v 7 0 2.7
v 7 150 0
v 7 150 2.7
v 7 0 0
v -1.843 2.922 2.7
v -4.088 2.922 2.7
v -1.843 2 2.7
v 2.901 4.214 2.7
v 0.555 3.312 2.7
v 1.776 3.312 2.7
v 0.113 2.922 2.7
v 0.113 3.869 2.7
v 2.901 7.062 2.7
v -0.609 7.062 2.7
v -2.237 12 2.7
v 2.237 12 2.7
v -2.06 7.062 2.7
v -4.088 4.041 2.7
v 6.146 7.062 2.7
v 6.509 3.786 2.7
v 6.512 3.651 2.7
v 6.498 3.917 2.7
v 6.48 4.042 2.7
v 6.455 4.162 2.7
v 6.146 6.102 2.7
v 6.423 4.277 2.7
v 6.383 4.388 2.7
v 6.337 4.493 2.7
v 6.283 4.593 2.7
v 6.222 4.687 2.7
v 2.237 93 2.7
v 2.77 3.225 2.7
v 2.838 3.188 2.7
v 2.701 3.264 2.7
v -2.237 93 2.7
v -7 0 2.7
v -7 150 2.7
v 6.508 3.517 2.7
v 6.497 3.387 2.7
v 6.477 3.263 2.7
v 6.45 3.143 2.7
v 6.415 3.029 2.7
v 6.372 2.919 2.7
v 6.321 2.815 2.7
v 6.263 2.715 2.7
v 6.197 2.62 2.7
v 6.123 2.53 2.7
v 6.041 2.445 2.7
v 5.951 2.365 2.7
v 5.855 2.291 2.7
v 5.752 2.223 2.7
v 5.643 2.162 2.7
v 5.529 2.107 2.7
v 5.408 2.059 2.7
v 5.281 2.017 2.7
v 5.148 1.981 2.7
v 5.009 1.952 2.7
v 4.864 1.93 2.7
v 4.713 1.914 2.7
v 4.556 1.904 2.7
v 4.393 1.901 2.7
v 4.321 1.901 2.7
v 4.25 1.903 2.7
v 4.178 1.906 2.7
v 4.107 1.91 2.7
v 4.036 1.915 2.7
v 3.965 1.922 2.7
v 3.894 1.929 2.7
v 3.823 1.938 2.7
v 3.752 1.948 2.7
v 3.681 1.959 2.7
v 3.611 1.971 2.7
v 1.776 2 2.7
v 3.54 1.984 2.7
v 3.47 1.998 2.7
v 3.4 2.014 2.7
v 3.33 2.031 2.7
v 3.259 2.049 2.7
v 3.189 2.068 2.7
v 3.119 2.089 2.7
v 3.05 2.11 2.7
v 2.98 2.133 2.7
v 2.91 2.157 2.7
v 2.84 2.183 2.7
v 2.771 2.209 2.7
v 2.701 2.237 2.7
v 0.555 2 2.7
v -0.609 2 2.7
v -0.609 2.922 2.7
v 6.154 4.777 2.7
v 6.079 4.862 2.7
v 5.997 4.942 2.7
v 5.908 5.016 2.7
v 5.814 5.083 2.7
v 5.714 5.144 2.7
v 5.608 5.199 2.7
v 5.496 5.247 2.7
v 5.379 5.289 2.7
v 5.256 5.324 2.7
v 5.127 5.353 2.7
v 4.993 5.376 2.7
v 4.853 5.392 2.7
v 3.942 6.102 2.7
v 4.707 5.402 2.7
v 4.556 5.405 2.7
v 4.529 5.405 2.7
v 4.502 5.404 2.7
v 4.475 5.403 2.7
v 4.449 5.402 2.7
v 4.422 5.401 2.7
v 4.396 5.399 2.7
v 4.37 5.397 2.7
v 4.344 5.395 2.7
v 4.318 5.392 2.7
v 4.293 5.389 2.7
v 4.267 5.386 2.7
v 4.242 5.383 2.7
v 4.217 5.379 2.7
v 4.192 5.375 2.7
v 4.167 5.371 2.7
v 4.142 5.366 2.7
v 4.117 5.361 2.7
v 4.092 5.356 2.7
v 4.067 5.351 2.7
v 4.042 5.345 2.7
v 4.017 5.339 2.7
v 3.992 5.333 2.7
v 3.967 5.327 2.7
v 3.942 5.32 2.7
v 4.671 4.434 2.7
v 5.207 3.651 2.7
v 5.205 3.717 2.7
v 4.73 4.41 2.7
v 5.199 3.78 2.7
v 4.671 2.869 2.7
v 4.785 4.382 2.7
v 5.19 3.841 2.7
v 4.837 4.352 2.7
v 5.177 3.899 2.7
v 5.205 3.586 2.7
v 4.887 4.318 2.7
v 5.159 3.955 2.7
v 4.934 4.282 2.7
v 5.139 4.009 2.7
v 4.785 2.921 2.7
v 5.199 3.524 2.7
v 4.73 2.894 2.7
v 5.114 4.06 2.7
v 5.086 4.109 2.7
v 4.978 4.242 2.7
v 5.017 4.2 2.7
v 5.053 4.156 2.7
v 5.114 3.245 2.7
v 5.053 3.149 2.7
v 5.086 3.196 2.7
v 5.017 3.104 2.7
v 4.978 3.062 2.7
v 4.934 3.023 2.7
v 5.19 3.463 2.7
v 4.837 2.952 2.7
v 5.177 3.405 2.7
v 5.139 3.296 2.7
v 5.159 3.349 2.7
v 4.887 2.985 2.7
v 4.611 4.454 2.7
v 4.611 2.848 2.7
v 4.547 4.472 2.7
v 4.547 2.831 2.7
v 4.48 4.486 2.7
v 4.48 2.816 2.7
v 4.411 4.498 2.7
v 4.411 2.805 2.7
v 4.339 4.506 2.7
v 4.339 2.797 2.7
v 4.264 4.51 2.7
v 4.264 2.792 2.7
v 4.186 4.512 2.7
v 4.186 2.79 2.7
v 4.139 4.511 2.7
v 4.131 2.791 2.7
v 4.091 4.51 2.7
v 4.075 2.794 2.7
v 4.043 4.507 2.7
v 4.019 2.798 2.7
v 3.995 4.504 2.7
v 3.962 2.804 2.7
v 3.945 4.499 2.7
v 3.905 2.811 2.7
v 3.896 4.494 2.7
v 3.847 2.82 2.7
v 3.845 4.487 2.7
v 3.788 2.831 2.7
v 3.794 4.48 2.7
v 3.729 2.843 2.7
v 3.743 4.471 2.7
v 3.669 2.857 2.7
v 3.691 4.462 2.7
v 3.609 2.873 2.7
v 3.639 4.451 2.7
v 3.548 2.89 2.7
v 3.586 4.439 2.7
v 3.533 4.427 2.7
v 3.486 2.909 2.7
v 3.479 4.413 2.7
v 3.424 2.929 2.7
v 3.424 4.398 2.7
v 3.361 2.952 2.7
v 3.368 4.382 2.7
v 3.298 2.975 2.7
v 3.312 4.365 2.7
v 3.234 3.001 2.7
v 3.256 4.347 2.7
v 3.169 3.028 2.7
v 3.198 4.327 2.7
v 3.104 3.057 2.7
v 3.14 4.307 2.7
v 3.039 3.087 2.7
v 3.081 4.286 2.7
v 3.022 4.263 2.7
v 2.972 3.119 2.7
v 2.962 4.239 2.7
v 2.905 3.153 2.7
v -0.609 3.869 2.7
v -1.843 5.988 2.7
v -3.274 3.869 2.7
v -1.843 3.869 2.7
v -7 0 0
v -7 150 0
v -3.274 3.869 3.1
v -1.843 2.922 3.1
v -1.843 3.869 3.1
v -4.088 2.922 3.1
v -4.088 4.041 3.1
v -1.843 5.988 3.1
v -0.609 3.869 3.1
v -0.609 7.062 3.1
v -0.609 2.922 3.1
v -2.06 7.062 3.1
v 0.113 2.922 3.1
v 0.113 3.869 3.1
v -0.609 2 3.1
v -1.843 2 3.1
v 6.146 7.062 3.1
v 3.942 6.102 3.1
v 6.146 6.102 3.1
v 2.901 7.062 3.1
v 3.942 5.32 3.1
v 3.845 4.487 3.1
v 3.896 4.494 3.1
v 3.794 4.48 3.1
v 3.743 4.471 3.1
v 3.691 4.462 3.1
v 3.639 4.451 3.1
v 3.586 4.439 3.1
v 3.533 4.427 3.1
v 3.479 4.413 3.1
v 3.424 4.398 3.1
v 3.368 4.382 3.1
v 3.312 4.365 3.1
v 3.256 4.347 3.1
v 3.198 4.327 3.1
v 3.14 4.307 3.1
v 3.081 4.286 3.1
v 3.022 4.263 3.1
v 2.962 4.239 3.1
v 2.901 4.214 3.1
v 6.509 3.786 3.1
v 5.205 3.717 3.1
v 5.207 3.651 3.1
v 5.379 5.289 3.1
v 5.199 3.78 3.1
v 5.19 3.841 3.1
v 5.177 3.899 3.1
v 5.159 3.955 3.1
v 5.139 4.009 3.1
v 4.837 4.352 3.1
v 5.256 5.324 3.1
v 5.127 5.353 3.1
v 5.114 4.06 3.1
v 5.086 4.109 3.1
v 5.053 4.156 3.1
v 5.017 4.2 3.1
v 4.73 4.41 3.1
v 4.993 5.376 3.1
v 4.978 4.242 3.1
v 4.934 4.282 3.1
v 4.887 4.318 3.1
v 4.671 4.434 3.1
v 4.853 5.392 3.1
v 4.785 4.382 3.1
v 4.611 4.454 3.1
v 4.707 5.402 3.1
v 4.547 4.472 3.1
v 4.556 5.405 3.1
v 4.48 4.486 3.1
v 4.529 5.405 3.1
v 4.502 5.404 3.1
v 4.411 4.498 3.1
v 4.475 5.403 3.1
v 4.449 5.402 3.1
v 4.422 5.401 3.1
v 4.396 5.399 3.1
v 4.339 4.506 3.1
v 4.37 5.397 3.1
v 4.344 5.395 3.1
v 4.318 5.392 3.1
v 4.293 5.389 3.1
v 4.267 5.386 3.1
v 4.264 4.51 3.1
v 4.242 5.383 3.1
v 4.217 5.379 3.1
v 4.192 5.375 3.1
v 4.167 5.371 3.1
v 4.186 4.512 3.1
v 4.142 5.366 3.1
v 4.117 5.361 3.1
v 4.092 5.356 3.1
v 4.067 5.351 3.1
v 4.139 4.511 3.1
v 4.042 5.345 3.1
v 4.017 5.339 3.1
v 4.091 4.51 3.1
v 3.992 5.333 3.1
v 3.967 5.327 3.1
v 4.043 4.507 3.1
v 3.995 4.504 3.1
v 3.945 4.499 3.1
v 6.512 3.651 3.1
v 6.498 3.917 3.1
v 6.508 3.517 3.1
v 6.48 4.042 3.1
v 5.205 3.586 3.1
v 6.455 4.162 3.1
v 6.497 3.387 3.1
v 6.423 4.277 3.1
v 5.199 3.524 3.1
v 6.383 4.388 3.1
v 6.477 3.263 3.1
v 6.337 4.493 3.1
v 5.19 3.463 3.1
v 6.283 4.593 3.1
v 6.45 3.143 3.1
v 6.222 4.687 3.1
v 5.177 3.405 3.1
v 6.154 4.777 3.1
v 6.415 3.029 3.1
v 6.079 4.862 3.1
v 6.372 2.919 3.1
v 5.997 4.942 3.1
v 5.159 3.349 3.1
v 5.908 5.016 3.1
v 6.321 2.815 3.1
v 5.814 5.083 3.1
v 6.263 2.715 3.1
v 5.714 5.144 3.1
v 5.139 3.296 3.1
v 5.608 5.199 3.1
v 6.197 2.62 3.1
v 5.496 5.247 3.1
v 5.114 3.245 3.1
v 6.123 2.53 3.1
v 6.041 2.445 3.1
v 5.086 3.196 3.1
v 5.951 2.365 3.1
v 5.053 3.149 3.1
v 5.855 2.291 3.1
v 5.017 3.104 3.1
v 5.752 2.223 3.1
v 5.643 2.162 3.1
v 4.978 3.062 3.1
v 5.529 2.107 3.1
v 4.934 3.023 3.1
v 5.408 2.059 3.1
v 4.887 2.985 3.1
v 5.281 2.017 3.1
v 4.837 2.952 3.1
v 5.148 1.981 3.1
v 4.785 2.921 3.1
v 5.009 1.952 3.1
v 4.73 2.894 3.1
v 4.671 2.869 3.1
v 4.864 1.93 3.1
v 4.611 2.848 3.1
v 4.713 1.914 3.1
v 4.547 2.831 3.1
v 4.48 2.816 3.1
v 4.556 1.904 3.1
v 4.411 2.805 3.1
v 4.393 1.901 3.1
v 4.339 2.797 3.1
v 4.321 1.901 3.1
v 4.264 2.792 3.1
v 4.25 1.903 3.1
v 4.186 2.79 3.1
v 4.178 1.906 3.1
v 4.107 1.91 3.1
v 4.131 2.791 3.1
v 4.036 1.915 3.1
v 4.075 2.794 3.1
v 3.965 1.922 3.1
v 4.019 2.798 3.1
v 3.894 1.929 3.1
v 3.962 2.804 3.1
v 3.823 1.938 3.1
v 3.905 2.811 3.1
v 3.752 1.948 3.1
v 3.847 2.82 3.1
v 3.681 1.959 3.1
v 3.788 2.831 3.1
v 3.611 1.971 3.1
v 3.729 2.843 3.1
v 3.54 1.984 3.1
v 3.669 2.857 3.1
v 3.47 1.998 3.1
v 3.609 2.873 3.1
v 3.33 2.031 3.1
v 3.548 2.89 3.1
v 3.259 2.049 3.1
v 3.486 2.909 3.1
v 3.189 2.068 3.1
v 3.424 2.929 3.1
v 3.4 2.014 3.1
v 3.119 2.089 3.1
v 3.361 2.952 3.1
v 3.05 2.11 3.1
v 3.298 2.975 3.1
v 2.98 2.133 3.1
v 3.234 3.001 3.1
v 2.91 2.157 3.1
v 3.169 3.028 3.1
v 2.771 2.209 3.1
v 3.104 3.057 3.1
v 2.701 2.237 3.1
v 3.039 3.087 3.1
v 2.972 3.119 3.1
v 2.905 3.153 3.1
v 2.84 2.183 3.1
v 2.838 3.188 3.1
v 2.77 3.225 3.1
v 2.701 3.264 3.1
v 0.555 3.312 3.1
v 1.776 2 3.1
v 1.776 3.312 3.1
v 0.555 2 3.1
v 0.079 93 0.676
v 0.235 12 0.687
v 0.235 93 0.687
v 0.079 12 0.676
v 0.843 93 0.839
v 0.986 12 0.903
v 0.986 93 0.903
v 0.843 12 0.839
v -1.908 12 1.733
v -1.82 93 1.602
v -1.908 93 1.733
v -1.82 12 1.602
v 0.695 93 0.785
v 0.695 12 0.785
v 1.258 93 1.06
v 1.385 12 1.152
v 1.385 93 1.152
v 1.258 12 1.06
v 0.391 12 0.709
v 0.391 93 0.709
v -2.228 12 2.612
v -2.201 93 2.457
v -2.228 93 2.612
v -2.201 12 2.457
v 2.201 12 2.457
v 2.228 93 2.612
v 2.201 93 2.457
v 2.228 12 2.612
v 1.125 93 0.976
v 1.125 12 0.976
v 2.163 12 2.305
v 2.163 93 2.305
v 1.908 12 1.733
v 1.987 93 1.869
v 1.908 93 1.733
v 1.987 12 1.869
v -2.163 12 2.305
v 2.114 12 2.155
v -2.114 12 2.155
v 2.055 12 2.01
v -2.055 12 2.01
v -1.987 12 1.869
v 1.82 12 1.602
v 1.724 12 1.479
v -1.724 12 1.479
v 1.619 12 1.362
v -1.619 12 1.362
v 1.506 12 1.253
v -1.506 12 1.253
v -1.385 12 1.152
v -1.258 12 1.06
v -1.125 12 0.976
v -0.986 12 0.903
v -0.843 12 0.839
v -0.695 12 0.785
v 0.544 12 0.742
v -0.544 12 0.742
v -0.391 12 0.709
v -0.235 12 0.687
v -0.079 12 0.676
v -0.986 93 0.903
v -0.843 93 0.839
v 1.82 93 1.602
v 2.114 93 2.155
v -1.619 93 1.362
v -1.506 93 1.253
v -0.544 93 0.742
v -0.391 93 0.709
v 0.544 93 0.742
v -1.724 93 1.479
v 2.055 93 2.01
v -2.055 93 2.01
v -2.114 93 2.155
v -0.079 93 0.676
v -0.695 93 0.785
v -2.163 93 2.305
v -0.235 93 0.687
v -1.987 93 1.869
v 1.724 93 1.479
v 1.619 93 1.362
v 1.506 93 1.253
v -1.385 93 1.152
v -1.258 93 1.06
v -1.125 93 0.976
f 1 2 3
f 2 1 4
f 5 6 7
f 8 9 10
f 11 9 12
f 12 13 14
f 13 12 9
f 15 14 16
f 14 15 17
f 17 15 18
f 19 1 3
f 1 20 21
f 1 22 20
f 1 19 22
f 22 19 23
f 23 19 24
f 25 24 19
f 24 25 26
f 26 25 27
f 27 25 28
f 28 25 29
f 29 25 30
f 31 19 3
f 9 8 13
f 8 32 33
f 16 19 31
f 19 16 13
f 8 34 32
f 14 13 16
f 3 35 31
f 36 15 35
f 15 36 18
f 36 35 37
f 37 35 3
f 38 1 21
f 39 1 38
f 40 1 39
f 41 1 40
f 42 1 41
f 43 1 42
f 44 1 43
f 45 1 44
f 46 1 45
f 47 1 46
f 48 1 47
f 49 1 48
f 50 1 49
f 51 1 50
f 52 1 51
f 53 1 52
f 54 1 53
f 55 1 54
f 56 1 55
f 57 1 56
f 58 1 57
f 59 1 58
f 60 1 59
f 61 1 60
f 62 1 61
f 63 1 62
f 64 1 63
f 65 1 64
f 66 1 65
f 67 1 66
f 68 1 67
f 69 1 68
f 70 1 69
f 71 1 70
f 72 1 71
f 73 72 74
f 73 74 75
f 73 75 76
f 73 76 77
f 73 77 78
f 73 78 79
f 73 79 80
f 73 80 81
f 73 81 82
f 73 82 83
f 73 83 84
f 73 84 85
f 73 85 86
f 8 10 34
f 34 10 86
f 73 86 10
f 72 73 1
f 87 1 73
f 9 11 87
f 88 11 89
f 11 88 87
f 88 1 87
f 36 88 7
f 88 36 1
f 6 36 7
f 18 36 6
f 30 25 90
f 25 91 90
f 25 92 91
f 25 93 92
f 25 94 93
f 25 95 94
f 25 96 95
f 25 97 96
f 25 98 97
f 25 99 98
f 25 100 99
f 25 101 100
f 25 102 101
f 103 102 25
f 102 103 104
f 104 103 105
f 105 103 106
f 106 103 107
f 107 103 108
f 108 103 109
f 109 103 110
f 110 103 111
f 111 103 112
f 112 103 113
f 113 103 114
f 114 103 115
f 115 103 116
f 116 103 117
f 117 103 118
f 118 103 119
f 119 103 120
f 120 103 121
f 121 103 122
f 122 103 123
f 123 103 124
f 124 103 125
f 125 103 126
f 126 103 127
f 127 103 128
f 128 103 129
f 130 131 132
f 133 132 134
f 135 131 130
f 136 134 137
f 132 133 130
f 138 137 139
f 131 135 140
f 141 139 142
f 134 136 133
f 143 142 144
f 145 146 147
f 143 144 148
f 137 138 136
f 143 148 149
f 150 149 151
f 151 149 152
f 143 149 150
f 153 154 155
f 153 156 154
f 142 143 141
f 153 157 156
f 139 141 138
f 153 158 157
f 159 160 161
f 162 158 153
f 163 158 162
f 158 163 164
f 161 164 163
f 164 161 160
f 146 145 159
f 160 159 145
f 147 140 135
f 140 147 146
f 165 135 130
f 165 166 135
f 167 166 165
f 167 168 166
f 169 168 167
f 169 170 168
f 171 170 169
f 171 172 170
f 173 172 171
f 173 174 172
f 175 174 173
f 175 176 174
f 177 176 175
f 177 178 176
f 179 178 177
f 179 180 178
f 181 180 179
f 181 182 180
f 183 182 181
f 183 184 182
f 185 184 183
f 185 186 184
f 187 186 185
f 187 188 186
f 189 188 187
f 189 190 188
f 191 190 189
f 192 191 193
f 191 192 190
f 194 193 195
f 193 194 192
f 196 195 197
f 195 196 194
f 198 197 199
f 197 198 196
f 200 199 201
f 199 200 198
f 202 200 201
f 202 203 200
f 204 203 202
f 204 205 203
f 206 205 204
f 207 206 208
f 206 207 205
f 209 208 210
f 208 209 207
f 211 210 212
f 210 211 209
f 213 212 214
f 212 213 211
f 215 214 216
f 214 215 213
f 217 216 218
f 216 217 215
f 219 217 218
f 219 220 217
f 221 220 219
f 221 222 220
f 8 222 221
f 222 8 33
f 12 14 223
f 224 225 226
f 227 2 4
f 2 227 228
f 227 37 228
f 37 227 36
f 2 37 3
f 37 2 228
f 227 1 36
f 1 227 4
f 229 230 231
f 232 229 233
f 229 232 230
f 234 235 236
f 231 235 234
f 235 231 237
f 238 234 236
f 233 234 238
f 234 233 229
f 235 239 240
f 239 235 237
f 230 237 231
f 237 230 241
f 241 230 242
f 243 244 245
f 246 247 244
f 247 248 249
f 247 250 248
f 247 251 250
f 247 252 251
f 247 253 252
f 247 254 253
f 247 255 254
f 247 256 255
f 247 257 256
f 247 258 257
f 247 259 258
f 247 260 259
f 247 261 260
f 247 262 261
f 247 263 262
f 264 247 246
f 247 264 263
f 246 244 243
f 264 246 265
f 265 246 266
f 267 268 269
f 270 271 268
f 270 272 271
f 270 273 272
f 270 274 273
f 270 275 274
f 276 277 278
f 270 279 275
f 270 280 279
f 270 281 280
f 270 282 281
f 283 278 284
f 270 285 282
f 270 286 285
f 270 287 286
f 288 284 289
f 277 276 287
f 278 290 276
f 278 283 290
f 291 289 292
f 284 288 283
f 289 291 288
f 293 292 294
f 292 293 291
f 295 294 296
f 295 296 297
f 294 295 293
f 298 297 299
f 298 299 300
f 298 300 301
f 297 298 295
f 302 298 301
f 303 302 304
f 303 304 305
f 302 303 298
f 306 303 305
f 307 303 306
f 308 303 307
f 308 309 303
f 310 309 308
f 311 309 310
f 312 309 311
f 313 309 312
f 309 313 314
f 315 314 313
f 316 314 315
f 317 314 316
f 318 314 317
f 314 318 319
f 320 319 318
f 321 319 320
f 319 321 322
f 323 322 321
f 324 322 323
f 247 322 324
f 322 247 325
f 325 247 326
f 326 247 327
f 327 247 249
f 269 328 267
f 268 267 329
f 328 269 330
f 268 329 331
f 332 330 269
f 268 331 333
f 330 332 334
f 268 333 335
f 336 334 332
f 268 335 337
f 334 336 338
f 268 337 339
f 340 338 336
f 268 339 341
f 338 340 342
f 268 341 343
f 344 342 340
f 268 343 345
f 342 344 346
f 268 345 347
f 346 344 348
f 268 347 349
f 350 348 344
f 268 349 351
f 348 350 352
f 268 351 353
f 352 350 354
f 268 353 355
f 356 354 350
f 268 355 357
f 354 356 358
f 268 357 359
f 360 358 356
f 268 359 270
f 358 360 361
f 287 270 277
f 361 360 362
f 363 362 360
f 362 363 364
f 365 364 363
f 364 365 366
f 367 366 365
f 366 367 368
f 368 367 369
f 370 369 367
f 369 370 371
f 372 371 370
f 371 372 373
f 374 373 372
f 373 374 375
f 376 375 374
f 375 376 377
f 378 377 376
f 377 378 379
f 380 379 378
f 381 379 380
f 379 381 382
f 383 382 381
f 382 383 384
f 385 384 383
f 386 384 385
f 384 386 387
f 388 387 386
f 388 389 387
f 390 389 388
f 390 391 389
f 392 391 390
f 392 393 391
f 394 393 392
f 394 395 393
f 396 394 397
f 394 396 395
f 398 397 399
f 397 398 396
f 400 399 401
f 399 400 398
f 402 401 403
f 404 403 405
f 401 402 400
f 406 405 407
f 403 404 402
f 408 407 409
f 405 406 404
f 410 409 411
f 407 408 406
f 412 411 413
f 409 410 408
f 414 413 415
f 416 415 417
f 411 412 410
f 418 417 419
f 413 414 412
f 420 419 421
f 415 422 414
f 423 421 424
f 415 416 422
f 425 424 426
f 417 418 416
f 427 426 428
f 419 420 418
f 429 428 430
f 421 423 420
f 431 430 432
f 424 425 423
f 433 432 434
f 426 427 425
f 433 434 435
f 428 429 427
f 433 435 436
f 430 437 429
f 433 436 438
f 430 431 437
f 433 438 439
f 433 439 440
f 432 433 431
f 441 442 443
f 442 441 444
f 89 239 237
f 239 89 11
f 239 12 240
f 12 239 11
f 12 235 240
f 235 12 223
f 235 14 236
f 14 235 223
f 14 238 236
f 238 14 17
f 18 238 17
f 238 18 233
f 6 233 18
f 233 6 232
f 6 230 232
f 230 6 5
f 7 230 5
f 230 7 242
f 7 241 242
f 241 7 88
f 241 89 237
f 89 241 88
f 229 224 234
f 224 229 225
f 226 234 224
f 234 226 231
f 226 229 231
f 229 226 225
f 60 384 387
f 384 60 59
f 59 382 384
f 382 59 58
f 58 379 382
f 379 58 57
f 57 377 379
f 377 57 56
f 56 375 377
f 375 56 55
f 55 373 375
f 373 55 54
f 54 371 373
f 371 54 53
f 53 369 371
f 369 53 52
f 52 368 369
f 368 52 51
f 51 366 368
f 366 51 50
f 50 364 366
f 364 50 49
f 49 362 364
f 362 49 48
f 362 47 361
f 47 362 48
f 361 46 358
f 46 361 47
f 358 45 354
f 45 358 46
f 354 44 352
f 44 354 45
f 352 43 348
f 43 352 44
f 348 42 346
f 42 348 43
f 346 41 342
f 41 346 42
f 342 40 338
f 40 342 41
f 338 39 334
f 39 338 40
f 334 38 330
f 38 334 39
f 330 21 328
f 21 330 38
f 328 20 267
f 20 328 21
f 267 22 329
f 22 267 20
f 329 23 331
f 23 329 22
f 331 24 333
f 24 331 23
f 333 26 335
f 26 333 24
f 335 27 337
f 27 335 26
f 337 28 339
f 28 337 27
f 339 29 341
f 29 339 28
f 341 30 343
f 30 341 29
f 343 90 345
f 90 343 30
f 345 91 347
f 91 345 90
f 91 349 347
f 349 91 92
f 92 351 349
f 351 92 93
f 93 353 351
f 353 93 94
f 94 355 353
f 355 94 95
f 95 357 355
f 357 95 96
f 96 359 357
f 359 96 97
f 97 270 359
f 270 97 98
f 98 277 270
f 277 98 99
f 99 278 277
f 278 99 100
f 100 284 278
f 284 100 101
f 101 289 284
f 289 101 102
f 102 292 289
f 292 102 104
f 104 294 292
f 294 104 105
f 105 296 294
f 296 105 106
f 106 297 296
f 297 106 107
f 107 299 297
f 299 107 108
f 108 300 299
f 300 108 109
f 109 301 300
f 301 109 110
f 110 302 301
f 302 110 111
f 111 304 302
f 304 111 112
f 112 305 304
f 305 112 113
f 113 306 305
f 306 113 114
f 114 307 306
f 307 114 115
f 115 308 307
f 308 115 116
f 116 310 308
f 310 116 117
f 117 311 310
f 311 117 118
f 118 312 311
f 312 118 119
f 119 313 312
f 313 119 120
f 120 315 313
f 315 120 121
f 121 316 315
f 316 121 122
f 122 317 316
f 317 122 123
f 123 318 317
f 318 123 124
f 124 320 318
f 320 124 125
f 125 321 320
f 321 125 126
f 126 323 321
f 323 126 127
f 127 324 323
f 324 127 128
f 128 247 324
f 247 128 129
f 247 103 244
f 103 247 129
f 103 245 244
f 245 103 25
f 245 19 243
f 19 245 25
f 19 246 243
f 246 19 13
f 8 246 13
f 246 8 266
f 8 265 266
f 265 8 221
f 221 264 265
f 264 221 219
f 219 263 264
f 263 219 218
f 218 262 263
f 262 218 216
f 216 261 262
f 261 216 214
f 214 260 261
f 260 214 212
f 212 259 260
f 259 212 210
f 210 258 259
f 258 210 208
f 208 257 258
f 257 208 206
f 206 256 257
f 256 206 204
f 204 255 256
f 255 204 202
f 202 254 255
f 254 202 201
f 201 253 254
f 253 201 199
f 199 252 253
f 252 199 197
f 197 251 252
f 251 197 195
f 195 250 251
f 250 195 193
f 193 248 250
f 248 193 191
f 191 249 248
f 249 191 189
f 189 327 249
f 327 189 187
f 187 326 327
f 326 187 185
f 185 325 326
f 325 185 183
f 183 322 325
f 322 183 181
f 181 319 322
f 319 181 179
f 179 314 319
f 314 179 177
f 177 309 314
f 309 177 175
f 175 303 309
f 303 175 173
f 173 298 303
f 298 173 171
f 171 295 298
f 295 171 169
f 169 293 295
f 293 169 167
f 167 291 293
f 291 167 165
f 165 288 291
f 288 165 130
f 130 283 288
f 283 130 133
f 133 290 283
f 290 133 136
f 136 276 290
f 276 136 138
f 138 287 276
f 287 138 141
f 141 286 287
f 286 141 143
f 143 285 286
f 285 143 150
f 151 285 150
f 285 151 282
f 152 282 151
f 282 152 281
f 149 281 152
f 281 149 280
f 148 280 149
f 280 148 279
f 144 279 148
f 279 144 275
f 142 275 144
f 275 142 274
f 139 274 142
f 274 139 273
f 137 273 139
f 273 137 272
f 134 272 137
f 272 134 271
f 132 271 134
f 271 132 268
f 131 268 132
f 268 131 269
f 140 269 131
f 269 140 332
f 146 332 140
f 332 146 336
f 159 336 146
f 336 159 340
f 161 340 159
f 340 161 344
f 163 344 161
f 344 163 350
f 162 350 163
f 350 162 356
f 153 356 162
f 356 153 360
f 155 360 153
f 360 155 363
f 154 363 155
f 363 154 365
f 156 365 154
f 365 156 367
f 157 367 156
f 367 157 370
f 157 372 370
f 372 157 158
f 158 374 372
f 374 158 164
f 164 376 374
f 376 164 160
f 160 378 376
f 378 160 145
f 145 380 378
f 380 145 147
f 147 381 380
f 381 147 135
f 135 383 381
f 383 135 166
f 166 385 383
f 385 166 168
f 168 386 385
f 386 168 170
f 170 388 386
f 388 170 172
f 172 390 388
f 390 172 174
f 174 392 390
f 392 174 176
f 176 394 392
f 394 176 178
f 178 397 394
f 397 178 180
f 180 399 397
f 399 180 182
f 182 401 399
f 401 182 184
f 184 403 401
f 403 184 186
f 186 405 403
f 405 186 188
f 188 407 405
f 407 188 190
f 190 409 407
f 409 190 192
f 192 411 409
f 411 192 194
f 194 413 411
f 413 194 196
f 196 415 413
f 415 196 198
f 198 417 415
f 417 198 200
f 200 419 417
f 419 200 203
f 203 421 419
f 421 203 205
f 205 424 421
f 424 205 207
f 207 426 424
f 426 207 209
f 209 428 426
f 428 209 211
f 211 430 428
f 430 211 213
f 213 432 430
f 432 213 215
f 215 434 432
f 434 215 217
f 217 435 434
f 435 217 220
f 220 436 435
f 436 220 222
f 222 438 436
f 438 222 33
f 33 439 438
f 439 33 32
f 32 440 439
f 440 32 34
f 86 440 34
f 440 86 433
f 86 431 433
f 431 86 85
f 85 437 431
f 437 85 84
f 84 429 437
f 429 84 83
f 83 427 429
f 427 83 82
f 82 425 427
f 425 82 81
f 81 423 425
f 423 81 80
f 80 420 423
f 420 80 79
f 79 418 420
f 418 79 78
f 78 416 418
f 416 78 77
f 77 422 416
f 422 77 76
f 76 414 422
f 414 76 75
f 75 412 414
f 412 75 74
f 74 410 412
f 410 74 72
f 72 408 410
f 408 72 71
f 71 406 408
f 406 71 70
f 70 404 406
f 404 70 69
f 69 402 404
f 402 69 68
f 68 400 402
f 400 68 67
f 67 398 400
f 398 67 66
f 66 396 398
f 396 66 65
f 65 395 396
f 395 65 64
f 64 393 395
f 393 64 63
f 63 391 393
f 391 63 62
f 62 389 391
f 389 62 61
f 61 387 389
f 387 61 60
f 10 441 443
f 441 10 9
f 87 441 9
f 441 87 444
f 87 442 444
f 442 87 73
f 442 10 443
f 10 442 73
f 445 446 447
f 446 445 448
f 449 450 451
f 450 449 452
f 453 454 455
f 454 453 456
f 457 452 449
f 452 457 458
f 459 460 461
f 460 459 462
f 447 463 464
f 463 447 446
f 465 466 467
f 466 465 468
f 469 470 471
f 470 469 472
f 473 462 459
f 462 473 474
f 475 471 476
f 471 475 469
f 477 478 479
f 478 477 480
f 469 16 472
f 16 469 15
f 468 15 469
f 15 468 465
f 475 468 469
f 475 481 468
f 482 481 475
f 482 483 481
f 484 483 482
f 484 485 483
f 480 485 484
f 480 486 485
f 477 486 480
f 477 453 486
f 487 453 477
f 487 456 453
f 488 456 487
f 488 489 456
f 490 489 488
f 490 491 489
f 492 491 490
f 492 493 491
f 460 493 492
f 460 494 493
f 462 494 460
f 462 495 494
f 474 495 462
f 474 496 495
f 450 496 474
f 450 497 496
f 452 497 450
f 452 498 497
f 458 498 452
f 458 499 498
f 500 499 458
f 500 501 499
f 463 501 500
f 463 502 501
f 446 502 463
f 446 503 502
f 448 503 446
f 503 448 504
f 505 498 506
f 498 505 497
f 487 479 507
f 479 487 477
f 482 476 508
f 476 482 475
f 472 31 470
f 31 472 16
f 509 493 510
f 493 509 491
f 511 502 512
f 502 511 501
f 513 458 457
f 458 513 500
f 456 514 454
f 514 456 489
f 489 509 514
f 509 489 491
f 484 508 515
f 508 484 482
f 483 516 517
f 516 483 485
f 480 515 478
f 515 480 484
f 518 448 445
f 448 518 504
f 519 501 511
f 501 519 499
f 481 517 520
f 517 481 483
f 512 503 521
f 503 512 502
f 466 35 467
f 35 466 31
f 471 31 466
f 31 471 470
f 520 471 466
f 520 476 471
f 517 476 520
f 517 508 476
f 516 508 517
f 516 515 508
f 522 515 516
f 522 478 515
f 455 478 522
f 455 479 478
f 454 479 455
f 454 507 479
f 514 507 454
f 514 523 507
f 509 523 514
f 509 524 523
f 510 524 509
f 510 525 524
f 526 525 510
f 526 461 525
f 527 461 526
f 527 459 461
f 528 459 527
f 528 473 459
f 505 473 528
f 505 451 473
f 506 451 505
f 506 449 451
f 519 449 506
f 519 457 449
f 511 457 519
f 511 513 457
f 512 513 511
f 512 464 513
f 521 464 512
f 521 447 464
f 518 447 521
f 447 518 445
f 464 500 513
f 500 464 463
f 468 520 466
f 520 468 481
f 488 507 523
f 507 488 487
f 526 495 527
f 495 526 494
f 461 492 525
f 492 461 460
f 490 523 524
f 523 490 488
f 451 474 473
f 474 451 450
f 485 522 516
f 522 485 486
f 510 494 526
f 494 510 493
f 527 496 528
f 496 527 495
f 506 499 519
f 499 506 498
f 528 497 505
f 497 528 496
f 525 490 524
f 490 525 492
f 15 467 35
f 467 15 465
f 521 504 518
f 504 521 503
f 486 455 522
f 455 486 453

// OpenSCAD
// file: module/drill-bit-storage.scad
/*
    Drill bit storage
*/

$fn=90;  // accuracy


// Constants (Don't change)
storageLenght = 100; // Not Bit lenght
maxBitLenght  = 70;  // Check bit lenght
storageWidth  = 10;  // Minimum width

// Bit dependent
bitDiameter = 4.0;



module drillBitStorage (bitDiameter,maxBitLenght,
	storageWidth,storageLenght){

// Automatic Variables  (Don't change)
diameterText      = str(bitDiameter);
storageHight      = bitDiameter*0.6; 
bitRadius         = bitDiameter/2;
bitPositionHeight = storageHight+bitDiameter*0.05; 


// Delition for crating drill track
difference() {

// Union for text and storage
union(){

// Storage 
translate([
    -storageWidth/2,    // Centering
    0, 
    0
    ]) 
cube(size = [
    storageWidth,
    storageLenght,
    storageHight
    ]);

// Milimiter dimension text
translate([
    -4.4,               // Fine deling x-axis
    2,                  // Fine deling y-axis 
    storageHight         
    ])
linear_extrude(height=0.4)text(
    diameterText,  // Dynamic text
    size=5,
    font="tohoma:style=bold",
    spacing=0.9
    );
    
// End of union    
}  

// Begining of Delition
// Drill tracl
rotate([90,0,0])
translate([
    0,                   // x-axis
    bitPositionHeight,   // Z-axis
    -(maxBitLenght+12)    // y-axis
    ])  
cylinder(
    h = maxBitLenght,    // y-axis
    r = bitRadius        // x-axis 
    );      

// End of Delition
}}
// main file
/*
    Drill bit storage
*/

$fn=90;  // accuracy

// import module
use <module/drill-bit-storage.scad>;



// Tootale lenght of the unit
storageLenght = 150; 

// Width of the unit
storageWidth  = 14;  // (Constant under 4mm)  

// The lenght of the drill bit
maxBitLenght  = 81;  

// Drill bit diameter  
bitDiameter = 4.5;


// Call the module
drillBitStorage 
    (bitDiameter,maxBitLenght,storageWidth,storageLenght);
